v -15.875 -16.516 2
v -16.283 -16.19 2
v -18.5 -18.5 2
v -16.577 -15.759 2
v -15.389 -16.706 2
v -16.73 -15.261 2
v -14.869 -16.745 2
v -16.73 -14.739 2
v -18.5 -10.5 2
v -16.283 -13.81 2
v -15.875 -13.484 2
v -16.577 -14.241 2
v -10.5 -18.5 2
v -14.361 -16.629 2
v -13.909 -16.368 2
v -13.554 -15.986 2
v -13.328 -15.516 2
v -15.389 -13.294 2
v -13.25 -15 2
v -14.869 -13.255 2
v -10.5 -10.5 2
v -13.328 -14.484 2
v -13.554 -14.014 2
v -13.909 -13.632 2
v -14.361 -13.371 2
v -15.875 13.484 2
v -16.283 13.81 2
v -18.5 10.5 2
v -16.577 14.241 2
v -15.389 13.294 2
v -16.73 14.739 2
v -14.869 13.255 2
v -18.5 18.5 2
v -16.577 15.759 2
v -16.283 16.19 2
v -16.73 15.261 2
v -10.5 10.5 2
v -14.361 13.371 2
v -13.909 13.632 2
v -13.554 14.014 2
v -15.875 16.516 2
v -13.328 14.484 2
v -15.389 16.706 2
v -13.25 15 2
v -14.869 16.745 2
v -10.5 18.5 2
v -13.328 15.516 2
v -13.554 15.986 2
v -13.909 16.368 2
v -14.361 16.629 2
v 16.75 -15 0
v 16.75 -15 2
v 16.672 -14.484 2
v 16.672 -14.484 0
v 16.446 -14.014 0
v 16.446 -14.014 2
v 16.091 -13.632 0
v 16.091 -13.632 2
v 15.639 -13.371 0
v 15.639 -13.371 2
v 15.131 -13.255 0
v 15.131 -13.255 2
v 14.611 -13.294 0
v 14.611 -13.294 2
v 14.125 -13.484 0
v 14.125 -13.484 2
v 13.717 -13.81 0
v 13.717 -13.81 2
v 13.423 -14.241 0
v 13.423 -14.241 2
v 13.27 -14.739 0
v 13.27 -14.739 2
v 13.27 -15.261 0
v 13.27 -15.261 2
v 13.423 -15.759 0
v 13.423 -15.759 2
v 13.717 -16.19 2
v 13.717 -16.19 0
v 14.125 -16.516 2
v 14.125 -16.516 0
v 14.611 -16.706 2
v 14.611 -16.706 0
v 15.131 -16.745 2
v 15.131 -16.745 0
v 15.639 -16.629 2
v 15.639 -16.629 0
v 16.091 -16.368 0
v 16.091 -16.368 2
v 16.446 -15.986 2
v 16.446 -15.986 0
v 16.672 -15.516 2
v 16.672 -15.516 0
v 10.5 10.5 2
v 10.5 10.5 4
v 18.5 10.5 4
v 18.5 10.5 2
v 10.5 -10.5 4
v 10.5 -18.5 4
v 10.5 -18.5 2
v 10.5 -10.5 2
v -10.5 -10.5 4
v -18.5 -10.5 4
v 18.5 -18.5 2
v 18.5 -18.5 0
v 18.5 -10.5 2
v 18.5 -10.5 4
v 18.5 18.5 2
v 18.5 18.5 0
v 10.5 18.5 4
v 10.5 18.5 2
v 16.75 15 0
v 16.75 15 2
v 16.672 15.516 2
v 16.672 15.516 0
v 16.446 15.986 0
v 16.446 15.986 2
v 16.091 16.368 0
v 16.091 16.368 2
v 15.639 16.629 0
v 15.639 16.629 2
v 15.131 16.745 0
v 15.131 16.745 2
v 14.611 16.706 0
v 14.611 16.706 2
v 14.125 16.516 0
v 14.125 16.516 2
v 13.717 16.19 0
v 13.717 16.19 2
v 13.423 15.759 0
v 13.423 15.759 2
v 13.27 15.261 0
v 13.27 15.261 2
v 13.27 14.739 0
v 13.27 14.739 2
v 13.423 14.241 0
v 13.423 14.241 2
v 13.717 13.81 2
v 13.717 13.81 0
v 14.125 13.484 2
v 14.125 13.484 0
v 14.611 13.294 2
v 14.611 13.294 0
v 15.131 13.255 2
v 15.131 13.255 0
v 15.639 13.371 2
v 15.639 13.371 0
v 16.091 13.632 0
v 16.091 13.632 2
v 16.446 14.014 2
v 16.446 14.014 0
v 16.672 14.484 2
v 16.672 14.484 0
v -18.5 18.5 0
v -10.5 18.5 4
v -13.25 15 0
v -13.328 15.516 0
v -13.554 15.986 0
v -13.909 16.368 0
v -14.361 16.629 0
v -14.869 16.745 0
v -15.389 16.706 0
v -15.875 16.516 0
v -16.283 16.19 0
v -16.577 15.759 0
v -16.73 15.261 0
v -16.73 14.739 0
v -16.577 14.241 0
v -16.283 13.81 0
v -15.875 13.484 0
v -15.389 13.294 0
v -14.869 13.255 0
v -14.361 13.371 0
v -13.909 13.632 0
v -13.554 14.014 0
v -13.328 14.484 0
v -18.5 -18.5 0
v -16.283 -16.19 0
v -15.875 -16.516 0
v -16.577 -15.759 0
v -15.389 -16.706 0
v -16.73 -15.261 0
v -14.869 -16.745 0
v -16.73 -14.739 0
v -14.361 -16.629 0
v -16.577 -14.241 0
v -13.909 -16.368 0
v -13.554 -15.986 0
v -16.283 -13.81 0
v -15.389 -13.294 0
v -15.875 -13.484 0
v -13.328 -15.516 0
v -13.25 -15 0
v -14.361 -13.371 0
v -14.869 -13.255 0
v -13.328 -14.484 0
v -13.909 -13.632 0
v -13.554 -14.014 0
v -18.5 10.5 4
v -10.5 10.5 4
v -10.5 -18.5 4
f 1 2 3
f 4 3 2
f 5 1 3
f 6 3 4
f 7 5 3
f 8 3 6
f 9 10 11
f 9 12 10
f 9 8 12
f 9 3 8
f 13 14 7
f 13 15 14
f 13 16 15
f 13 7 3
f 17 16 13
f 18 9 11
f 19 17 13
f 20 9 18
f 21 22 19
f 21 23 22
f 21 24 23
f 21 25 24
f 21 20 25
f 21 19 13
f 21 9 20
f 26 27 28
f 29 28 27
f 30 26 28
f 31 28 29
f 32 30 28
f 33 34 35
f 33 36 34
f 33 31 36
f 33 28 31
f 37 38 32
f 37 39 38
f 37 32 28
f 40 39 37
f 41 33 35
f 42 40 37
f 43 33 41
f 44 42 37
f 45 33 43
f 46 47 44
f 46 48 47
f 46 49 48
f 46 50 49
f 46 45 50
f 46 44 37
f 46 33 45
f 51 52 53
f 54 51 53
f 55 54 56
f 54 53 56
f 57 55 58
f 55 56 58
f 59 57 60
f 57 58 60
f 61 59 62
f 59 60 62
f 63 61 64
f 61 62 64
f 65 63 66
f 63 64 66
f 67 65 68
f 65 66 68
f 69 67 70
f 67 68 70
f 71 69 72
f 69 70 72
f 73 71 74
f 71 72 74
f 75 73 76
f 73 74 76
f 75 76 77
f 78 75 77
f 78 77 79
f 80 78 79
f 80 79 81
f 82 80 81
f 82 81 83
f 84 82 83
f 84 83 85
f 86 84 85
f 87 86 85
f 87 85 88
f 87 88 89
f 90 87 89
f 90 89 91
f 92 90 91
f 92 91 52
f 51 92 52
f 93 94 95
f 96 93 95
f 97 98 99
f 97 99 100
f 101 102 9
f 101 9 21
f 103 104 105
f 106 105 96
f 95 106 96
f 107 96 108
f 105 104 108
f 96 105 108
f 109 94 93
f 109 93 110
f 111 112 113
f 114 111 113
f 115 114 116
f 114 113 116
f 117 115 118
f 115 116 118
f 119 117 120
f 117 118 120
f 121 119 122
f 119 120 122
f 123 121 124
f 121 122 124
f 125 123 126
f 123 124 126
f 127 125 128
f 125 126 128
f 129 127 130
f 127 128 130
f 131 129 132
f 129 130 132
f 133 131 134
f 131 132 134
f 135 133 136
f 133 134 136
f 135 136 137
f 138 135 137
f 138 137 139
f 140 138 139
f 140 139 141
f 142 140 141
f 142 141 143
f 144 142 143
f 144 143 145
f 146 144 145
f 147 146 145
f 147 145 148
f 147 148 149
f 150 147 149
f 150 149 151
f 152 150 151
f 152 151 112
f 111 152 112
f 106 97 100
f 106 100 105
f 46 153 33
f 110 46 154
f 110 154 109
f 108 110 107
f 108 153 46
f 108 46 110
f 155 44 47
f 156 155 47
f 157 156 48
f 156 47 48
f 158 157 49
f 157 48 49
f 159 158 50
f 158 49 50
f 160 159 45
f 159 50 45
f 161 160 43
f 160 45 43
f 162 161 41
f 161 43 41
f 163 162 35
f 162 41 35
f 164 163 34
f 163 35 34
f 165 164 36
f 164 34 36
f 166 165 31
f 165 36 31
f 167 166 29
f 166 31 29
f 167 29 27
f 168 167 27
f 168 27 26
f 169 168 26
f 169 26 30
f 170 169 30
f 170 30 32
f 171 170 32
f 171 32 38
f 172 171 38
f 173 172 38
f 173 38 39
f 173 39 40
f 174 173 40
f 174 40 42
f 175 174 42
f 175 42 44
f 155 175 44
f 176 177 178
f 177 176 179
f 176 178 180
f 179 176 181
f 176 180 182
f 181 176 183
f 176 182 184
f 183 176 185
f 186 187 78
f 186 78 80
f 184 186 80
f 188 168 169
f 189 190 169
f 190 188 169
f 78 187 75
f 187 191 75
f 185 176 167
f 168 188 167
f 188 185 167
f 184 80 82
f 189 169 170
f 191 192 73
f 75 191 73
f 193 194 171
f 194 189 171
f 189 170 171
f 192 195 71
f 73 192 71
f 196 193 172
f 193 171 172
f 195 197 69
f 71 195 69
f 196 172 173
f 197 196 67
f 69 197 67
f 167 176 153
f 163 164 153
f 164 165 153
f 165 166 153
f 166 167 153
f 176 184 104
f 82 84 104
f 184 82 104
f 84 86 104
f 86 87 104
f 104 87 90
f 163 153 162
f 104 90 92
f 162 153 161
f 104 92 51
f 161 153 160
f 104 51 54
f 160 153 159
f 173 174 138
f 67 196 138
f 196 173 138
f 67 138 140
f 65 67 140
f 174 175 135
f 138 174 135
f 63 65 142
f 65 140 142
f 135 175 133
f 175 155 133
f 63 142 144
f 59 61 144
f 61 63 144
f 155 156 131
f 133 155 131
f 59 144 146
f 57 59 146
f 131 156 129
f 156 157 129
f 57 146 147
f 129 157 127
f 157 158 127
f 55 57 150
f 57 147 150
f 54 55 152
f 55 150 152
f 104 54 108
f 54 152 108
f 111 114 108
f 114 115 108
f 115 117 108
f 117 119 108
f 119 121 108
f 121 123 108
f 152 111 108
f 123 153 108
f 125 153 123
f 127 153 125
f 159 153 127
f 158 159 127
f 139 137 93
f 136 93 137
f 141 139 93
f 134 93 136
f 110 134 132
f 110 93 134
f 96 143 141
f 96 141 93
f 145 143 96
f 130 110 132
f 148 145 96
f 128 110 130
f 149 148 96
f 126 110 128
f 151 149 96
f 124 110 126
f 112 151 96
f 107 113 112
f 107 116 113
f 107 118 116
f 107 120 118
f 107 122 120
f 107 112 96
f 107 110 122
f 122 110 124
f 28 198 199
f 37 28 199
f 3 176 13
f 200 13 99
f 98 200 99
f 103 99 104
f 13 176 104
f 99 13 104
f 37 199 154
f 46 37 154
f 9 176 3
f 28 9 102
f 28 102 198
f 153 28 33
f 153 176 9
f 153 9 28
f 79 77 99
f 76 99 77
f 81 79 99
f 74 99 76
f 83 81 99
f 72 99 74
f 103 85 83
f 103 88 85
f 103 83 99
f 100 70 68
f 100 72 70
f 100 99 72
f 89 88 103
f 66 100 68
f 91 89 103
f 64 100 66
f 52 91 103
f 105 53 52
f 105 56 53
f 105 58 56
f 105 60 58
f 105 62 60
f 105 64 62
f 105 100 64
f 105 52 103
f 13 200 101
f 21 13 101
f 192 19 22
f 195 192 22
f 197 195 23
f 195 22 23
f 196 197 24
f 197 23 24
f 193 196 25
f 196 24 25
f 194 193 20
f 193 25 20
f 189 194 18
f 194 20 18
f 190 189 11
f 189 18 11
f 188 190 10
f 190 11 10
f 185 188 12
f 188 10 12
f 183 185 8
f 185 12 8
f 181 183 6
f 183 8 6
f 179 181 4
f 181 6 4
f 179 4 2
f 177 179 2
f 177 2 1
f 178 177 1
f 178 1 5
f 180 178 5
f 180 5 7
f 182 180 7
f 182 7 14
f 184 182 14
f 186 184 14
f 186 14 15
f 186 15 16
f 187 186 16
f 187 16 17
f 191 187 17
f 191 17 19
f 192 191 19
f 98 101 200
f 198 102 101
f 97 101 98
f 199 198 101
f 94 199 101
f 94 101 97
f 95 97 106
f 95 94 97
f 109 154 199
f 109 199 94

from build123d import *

# Parameters (mm, degrees)
SKETCH_W        = 37
SKETCH_H        = 37
PAD_DEPTH       = 4
SKETCH001_R     = 1.75
POCKET_DEPTH    = 4.001
SKETCH002_W     = 8
SKETCH002_H     = 8
POCKET001_DEPTH = 2


with BuildPart() as part:
    # Sketch → Pad (new body)
    with BuildSketch(Plane.XY):
        Rectangle(SKETCH_W, SKETCH_H)
    extrude(amount=PAD_DEPTH)

    # Sketch001 (on Face6 of Pad) → Pocket (cut, through all)
    with BuildSketch(Plane.XY.offset(4)):
        with Locations((-15, 15)):
            Circle(SKETCH001_R)
        with Locations((15, 15)):
            Circle(SKETCH001_R)
        with Locations((-15, -15)):
            Circle(SKETCH001_R)
        with Locations((15, -15)):
            Circle(SKETCH001_R)
    extrude(amount=-POCKET_DEPTH, mode=Mode.SUBTRACT)

    # Sketch002 (on Face5 of Pocket) → Pocket001 (cut)
    with BuildSketch(Plane.XY.offset(4)):
        with Locations((-14.5, 14.5)):
            Rectangle(SKETCH002_W, SKETCH002_H)
        with Locations((14.5, 14.5)):
            Rectangle(SKETCH002_W, SKETCH002_H)
        with Locations((14.5, -14.5)):
            Rectangle(SKETCH002_W, SKETCH002_H)
        with Locations((-14.5, -14.5)):
            Rectangle(SKETCH002_W, SKETCH002_H)
    extrude(amount=-POCKET001_DEPTH, mode=Mode.SUBTRACT)


solid = part.part
